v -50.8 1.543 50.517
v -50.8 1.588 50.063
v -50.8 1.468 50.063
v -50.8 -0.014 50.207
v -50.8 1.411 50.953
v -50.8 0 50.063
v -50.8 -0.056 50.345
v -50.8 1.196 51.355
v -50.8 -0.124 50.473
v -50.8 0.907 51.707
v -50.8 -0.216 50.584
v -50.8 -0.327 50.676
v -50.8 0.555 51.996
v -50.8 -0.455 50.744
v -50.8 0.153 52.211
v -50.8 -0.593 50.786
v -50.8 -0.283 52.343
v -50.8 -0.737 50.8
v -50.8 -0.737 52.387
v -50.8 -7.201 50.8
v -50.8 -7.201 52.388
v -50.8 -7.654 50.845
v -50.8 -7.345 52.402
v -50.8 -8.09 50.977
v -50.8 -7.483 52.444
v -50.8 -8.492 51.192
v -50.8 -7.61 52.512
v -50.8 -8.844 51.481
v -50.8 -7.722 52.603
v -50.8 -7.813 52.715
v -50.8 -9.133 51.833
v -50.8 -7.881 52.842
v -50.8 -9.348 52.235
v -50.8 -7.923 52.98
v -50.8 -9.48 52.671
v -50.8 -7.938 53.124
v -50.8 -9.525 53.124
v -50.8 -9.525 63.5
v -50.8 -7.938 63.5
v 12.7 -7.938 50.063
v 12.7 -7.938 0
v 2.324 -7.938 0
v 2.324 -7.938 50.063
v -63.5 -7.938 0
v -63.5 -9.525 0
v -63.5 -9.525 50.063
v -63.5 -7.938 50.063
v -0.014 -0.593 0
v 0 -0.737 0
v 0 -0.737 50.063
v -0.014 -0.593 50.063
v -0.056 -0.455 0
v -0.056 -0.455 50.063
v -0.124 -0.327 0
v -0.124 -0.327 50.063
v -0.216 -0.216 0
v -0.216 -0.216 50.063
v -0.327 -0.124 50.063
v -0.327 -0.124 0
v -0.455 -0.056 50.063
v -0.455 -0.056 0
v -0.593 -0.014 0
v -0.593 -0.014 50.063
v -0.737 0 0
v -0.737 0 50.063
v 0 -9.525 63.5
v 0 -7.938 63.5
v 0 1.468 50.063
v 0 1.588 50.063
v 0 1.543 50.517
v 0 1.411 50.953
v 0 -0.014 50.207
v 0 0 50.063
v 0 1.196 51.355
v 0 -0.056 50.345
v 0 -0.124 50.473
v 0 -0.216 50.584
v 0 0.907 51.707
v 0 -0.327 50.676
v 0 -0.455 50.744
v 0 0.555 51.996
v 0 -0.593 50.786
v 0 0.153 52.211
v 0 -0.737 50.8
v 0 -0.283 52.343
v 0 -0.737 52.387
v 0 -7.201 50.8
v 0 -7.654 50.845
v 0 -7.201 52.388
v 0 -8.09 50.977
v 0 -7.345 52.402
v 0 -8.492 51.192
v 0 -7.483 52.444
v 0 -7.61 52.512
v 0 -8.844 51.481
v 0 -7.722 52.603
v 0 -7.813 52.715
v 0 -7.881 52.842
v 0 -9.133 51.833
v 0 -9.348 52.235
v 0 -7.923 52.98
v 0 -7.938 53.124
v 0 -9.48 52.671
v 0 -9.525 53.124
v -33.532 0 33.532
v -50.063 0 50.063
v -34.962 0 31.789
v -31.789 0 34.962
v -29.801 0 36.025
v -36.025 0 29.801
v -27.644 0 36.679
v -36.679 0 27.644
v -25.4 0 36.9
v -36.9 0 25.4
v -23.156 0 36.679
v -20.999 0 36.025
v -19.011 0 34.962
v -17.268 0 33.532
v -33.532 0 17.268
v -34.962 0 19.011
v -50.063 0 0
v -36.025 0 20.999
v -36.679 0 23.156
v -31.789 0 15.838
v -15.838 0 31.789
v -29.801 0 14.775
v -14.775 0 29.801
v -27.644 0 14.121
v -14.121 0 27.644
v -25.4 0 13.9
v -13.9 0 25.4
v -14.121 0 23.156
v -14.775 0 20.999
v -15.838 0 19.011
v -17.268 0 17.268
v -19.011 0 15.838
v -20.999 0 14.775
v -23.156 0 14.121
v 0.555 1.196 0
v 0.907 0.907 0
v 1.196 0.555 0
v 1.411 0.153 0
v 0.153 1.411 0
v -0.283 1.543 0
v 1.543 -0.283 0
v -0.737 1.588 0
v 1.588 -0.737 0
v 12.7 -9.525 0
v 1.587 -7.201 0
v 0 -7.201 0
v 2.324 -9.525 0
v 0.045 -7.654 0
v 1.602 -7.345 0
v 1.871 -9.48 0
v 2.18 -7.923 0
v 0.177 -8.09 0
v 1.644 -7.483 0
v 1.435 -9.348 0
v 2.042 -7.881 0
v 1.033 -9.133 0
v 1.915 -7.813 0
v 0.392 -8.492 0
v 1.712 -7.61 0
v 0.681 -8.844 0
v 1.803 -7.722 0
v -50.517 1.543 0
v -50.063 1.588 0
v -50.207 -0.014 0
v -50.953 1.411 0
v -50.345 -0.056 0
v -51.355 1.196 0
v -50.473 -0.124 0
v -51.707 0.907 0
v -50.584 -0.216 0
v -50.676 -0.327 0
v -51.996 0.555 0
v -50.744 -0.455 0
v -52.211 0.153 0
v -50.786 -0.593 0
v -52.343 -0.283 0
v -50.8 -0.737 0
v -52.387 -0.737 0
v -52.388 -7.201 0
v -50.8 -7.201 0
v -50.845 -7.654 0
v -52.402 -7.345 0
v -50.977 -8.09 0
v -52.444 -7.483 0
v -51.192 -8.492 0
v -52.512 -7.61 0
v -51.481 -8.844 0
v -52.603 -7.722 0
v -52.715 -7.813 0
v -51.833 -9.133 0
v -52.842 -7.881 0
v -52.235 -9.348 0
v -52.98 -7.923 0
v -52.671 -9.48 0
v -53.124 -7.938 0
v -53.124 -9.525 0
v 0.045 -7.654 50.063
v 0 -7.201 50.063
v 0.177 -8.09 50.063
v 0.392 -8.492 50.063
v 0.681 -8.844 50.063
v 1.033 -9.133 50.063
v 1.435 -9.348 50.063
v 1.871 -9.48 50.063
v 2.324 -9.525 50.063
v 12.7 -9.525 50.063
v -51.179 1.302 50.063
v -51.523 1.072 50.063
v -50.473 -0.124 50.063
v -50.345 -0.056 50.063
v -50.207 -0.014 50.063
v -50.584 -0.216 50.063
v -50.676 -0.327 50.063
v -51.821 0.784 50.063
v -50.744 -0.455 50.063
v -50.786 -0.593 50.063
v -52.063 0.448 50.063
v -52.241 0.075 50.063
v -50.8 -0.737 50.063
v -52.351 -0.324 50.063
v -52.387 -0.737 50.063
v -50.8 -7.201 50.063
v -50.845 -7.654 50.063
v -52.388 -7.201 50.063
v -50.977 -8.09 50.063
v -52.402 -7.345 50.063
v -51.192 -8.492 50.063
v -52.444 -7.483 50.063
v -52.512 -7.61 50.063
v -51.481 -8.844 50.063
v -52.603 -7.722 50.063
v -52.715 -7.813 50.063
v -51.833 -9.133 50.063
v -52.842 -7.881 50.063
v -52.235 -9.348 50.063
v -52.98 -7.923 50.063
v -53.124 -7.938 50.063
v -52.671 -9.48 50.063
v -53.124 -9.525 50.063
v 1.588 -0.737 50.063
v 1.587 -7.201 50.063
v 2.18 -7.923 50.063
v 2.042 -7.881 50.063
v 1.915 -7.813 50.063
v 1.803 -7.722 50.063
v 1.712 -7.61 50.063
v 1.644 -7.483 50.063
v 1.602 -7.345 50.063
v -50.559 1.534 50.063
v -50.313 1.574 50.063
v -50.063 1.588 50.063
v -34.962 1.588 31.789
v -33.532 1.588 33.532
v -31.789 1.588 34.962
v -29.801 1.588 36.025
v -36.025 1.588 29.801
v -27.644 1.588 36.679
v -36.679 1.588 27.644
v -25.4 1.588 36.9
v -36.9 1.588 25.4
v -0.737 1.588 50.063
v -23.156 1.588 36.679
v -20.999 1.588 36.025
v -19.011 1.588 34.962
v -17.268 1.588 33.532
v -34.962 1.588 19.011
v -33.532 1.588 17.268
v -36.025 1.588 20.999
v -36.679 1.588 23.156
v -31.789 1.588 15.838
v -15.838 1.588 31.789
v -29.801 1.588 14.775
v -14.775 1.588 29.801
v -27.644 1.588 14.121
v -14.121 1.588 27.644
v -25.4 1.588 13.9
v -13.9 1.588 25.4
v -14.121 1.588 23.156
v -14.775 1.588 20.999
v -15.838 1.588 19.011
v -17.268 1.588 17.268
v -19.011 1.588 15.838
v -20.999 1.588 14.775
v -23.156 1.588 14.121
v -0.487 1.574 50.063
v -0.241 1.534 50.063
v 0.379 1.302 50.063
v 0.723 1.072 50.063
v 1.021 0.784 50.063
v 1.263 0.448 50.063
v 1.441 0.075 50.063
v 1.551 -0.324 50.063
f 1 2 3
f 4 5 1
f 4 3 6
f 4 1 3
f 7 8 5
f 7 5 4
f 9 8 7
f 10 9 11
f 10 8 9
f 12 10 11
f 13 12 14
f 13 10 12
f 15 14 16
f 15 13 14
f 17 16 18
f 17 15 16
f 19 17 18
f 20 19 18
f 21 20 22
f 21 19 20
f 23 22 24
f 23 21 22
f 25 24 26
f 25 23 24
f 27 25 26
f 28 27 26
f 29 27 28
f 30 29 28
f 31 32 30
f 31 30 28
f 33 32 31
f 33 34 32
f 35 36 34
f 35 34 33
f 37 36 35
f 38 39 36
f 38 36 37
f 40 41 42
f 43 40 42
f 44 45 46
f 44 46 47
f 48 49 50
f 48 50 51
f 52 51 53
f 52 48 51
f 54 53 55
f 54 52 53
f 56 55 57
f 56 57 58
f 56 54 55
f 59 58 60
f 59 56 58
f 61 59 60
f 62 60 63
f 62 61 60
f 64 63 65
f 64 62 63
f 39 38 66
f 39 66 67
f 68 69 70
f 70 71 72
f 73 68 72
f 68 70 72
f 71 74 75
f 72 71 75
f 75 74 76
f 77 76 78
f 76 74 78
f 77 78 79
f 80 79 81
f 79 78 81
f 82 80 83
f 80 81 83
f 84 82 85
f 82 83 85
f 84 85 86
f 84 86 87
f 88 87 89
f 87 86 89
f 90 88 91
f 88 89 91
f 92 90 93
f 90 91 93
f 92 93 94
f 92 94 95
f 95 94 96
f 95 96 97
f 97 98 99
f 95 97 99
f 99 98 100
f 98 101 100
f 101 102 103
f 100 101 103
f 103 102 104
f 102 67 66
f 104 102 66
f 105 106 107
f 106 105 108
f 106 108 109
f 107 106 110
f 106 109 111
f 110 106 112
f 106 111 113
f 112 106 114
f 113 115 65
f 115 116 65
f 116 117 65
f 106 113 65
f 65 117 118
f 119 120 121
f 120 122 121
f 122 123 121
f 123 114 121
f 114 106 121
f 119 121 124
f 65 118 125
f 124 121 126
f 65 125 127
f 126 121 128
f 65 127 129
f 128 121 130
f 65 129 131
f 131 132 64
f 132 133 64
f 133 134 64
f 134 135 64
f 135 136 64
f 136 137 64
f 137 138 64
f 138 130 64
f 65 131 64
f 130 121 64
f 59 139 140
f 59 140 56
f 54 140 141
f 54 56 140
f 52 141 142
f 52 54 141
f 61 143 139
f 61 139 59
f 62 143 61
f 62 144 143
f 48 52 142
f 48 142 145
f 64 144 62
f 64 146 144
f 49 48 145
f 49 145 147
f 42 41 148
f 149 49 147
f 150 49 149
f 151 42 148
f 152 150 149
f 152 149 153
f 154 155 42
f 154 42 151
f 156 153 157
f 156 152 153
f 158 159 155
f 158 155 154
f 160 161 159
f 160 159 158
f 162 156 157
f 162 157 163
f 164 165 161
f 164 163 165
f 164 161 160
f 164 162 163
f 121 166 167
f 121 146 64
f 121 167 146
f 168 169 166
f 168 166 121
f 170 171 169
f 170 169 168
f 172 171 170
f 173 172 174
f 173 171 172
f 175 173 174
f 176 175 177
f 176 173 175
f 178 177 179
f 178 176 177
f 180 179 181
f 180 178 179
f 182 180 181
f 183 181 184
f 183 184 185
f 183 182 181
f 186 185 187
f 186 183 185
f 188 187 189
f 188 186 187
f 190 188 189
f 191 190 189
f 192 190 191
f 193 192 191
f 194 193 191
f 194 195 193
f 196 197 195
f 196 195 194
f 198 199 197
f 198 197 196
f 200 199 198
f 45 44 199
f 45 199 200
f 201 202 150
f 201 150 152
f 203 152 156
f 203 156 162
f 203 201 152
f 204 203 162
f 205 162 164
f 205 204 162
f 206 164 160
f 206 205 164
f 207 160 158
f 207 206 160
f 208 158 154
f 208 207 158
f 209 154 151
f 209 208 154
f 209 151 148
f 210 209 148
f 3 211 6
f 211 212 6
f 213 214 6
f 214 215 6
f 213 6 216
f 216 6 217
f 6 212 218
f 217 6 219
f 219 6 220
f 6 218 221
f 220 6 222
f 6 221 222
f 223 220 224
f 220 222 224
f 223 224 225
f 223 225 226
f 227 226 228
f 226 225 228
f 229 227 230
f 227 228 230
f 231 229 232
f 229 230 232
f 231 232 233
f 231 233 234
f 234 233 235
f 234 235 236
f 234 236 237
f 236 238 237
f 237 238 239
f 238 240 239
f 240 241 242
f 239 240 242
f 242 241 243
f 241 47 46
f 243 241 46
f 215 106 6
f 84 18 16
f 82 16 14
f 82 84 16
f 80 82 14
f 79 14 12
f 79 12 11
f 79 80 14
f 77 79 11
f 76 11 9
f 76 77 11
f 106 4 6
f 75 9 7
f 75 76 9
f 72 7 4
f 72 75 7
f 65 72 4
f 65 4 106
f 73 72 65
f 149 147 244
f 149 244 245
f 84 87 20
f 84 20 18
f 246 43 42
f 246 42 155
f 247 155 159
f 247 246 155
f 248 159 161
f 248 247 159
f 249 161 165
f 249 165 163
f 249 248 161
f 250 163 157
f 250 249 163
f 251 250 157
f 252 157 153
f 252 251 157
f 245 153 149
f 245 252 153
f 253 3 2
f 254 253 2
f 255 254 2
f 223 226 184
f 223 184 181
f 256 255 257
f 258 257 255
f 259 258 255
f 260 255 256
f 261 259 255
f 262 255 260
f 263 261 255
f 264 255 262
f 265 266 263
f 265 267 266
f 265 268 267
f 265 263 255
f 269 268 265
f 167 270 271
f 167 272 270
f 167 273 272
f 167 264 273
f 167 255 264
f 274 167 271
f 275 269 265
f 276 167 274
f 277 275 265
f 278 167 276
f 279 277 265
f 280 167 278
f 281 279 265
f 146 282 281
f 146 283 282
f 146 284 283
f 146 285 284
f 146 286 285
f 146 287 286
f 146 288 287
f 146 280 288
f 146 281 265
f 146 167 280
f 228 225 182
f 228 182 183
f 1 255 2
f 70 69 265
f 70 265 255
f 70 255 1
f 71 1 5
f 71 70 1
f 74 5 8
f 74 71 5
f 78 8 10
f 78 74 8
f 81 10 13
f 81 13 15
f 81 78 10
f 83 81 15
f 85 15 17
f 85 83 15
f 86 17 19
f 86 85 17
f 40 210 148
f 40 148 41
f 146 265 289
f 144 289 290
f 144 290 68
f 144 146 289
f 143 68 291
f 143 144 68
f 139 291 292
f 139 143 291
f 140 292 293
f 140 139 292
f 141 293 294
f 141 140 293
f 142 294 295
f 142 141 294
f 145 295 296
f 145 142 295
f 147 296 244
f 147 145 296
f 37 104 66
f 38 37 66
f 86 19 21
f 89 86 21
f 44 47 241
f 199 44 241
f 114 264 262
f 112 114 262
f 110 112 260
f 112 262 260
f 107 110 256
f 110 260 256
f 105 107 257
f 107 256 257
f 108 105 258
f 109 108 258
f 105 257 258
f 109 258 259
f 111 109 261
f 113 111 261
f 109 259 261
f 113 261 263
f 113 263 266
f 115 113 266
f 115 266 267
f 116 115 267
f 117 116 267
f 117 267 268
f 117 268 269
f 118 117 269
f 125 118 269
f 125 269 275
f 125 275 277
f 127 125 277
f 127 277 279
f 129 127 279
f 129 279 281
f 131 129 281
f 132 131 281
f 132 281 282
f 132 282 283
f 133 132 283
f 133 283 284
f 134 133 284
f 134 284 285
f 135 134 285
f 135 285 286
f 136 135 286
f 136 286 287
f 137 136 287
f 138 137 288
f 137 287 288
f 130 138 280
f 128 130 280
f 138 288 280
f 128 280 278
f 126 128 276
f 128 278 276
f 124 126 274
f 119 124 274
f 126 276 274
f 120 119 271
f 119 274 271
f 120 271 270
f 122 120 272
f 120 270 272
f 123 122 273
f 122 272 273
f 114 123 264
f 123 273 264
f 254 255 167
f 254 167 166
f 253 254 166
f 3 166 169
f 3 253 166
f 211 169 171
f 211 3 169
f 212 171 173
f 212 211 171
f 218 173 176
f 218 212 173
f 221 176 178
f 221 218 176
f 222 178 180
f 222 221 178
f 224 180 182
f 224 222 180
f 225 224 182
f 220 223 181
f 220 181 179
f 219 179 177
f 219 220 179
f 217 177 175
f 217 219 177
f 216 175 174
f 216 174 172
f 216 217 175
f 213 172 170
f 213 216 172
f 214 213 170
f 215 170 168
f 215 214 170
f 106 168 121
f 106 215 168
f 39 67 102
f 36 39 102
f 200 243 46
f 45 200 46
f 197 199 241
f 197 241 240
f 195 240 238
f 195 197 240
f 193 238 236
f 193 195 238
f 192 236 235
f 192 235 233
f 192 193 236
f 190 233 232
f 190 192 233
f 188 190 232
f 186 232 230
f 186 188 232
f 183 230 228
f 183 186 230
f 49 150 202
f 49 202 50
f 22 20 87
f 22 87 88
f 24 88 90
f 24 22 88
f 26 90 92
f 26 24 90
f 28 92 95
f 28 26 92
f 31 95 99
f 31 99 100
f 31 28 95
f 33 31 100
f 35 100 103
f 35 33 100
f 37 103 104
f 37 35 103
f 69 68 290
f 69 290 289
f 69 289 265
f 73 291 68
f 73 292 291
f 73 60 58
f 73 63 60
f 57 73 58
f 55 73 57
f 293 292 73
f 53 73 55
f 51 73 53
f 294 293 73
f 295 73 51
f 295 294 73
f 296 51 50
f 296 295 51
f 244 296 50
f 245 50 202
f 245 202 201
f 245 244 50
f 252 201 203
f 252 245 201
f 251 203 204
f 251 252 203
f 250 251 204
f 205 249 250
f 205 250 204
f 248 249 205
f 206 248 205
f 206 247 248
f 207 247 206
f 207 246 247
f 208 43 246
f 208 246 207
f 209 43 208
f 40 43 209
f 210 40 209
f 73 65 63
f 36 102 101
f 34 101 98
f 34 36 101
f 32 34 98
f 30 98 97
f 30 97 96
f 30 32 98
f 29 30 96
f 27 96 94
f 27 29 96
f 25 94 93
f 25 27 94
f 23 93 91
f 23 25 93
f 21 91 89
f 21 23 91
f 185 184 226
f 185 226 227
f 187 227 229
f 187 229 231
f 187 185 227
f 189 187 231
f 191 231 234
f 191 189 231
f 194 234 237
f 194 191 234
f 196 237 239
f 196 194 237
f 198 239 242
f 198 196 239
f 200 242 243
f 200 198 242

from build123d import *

# Parameters (mm, degrees)
SKETCH6_W                      = 50.8
SKETCH6_H                      = 1.5875
BASE_FLANGE1_DEPTH             = 50.8
EDGE_FLANGE1_STRIP_W           = 7.8232
EDGE_FLANGE1_STRIP_H           = 1.5875
EDGE_FLANGE1_STRIP_CUT_DEPTH   = 50.8
EDGE_FLANGE1_DEPTH             = 50.8
SKETCH16_R                     = 11.5
CUT_EXTRUDE1_DEPTH             = 74.592226364
EDGE_FLANGE4_STRIP_W           = 7.8232
EDGE_FLANGE4_STRIP_H           = 1.5875
EDGE_FLANGE4_STRIP_CUT_DEPTH   = 50.0634
EDGE_FLANGE4_STRIP_2_W         = 7.8232
EDGE_FLANGE4_STRIP_2_H         = 1.5875
EDGE_FLANGE4_STRIP_CUT_2_DEPTH = 50.0634
EDGE_FLANGE4_DEPTH             = 50.0634
EDGE_FLANGE4_BEND_DEPTH        = 50.0634
EDGE_FLANGE5_STRIP_W           = 7.8232
EDGE_FLANGE5_STRIP_H           = 1.5875
EDGE_FLANGE5_STRIP_CUT_DEPTH   = 50.0634
EDGE_FLANGE5_STRIP_2_W         = 7.8232
EDGE_FLANGE5_STRIP_2_H         = 1.5875
EDGE_FLANGE5_STRIP_CUT_2_DEPTH = 50.0634
EDGE_FLANGE5_DEPTH             = 50.0634
EDGE_FLANGE5_BEND_DEPTH        = 50.0634
EDGE_FLANGE6_STRIP_W           = 7.8232
EDGE_FLANGE6_STRIP_H           = 1.5875
EDGE_FLANGE6_STRIP_CUT_DEPTH   = 50.8
EDGE_FLANGE6_DEPTH             = 50.8


# Sheet-metal steps are written as plain solids
with BuildPart() as part:
    # Sketch6 → Base-Flange1 (new body)
    with BuildSketch(Plane.XY):
        with Locations((-25.4, 0.79375)):
            Rectangle(SKETCH6_W, SKETCH6_H)
    extrude(amount=BASE_FLANGE1_DEPTH)

    # Edge-Flange1 strip (across the edge) → Edge-Flange1 strip cut (cut)
    with BuildSketch(Plane(origin=(0, 0, 50.8), x_dir=(0, 0, -1), z_dir=(-1, 0, 0))):
        with Locations((-3.175, -0.79375)):
            Rectangle(EDGE_FLANGE1_STRIP_W, EDGE_FLANGE1_STRIP_H)
    extrude(amount=EDGE_FLANGE1_STRIP_CUT_DEPTH, mode=Mode.SUBTRACT)

    # Edge-Flange1 section (across the edge) → Edge-Flange1 (add)
    with BuildSketch(Plane(origin=(0, 0, 50.8), x_dir=(0, 0, -1), z_dir=(-1, 0, 0))):
        with BuildLine():
            Line((-1.5875, 0.7366), (-1.5875, 7.9375))
            Line((-1.5875, 7.9375), (0, 7.9375))
            Line((0, 7.9375), (0, 0.7366))
            ThreePointArc((0, 0.7366), (0.215745145, 0.215745145), (0.7366, 0))
            Line((0.7366, 0), (0.7366, -1.5875))
            ThreePointArc((0.7366, -1.5875), (-0.90678687, -0.90678687), (-1.5875, 0.7366))
        make_face()
    extrude(amount=EDGE_FLANGE1_DEPTH)

    # Sketch16 → Cut-Extrude1 (cut, through all)
    with BuildSketch(Plane(origin=(0, 1.5875, 0), x_dir=(1, 0, 0), z_dir=(0, 1, 0))):
        with Locations(Location((-25.4, -25.4, 0), (0, 0, 180))):
            Circle(SKETCH16_R)
    extrude(amount=-CUT_EXTRUDE1_DEPTH, mode=Mode.SUBTRACT)

    # Edge-Flange4 strip (across the edge) → Edge-Flange4 strip cut (cut)
    with BuildSketch(Plane(origin=(0, 0, 0), x_dir=(-1, 0, 0), z_dir=(0, 0, 1))):
        with Locations((-3.175, -0.79375)):
            Rectangle(EDGE_FLANGE4_STRIP_W, EDGE_FLANGE4_STRIP_H)
    extrude(amount=EDGE_FLANGE4_STRIP_CUT_DEPTH, mode=Mode.SUBTRACT)

    # Edge-Flange4 strip 2 (across the edge) → Edge-Flange4 strip cut 2 (cut)
    with BuildSketch(Plane(origin=(-50.8, 0, 50.0634), x_dir=(1, 0, 0), z_dir=(0, 0, -1))):
        with Locations((-3.175, -0.79375)):
            Rectangle(EDGE_FLANGE4_STRIP_2_W, EDGE_FLANGE4_STRIP_2_H)
    extrude(amount=EDGE_FLANGE4_STRIP_CUT_2_DEPTH, mode=Mode.SUBTRACT)

    # Edge-Flange4 section (across the edge) → Edge-Flange4 (add)
    with BuildSketch(Plane(origin=(0, 0, 0), x_dir=(-1, 0, 0), z_dir=(0, 0, 1))):
        with BuildLine():
            Line((-1.5875, 0.7366), (-1.5875, 7.9375))
            Line((-1.5875, 7.9375), (0, 7.9375))
            Line((0, 7.9375), (0, 0.7366))
            ThreePointArc((0, 0.7366), (0.215745145, 0.215745145), (0.7366, 0))
            Line((0.7366, 0), (0.7366, -1.5875))
            ThreePointArc((0.7366, -1.5875), (-0.90678687, -0.90678687), (-1.5875, 0.7366))
        make_face()
    extrude(amount=EDGE_FLANGE4_DEPTH)

    # Edge-Flange4 section 2 (across the edge) → Edge-Flange4 bend (add)
    with BuildSketch(Plane(origin=(-50.8, 0, 50.0634), x_dir=(1, 0, 0), z_dir=(0, 0, -1))):
        with BuildLine():
            Line((-1.5875, 0.7366), (-1.5875, 7.9375))
            Line((-1.5875, 7.9375), (0, 7.9375))
            Line((0, 7.9375), (0, 0.7366))
            ThreePointArc((0, 0.7366), (0.215745145, 0.215745145), (0.7366, 0))
            Line((0.7366, 0), (0.7366, -1.5875))
            ThreePointArc((0.7366, -1.5875), (-0.90678687, -0.90678687), (-1.5875, 0.7366))
        make_face()
    extrude(amount=EDGE_FLANGE4_BEND_DEPTH)

    # Edge-Flange5 strip (across the edge) → Edge-Flange5 strip cut (cut)
    with BuildSketch(Plane(origin=(1.5875, -7.9375, 50.0634), x_dir=(0, 1, 0), z_dir=(0, 0, -1))):
        with Locations((-3.175, -0.79375)):
            Rectangle(EDGE_FLANGE5_STRIP_W, EDGE_FLANGE5_STRIP_H)
    extrude(amount=EDGE_FLANGE5_STRIP_CUT_DEPTH, mode=Mode.SUBTRACT)

    # Edge-Flange5 strip 2 (across the edge) → Edge-Flange5 strip cut 2 (cut)
    with BuildSketch(Plane(origin=(-52.3875, -7.9375, 0), x_dir=(0, 1, 0), z_dir=(0, 0, 1))):
        with Locations((-3.175, -0.79375)):
            Rectangle(EDGE_FLANGE5_STRIP_2_W, EDGE_FLANGE5_STRIP_2_H)
    extrude(amount=EDGE_FLANGE5_STRIP_CUT_2_DEPTH, mode=Mode.SUBTRACT)

    # Edge-Flange5 section (across the edge) → Edge-Flange5 (add)
    with BuildSketch(Plane(origin=(1.5875, -7.9375, 50.0634), x_dir=(0, 1, 0), z_dir=(0, 0, -1))):
        with BuildLine():
            Line((-1.5875, 0.7366), (-1.5875, 11.1125))
            Line((-1.5875, 11.1125), (0, 11.1125))
            Line((0, 11.1125), (0, 0.7366))
            ThreePointArc((0, 0.7366), (0.215745145, 0.215745145), (0.7366, 0))
            Line((0.7366, 0), (0.7366, -1.5875))
            ThreePointArc((0.7366, -1.5875), (-0.90678687, -0.90678687), (-1.5875, 0.7366))
        make_face()
    extrude(amount=EDGE_FLANGE5_DEPTH)

    # Edge-Flange5 section 2 (across the edge) → Edge-Flange5 bend (add)
    with BuildSketch(Plane(origin=(-52.3875, -7.9375, 0), x_dir=(0, 1, 0), z_dir=(0, 0, 1))):
        with BuildLine():
            Line((-1.5875, 0.7366), (-1.5875, 11.1125))
            Line((-1.5875, 11.1125), (0, 11.1125))
            Line((0, 11.1125), (0, 0.7366))
            ThreePointArc((0, 0.7366), (0.215745145, 0.215745145), (0.7366, 0))
            Line((0.7366, 0), (0.7366, -1.5875))
            ThreePointArc((0.7366, -1.5875), (-0.90678687, -0.90678687), (-1.5875, 0.7366))
        make_face()
    extrude(amount=EDGE_FLANGE5_BEND_DEPTH)

    # Edge-Flange6 strip (across the edge) → Edge-Flange6 strip cut (cut)
    with BuildSketch(Plane(origin=(-50.8, -7.9375, 52.3875), x_dir=(0, 1, 0), z_dir=(1, 0, 0))):
        with Locations((-3.175, -0.79375)):
            Rectangle(EDGE_FLANGE6_STRIP_W, EDGE_FLANGE6_STRIP_H)
    extrude(amount=EDGE_FLANGE6_STRIP_CUT_DEPTH, mode=Mode.SUBTRACT)

    # Edge-Flange6 section (across the edge) → Edge-Flange6 (add)
    with BuildSketch(Plane(origin=(-50.8, -7.9375, 52.3875), x_dir=(0, 1, 0), z_dir=(1, 0, 0))):
        with BuildLine():
            Line((-1.5875, 0.7366), (-1.5875, 11.1125))
            Line((-1.5875, 11.1125), (0, 11.1125))
            Line((0, 11.1125), (0, 0.7366))
            ThreePointArc((0, 0.7366), (0.215745145, 0.215745145), (0.7366, 0))
            Line((0.7366, 0), (0.7366, -1.5875))
            ThreePointArc((0.7366, -1.5875), (-0.90678687, -0.90678687), (-1.5875, 0.7366))
        make_face()
    extrude(amount=EDGE_FLANGE6_DEPTH)


solid = part.part
